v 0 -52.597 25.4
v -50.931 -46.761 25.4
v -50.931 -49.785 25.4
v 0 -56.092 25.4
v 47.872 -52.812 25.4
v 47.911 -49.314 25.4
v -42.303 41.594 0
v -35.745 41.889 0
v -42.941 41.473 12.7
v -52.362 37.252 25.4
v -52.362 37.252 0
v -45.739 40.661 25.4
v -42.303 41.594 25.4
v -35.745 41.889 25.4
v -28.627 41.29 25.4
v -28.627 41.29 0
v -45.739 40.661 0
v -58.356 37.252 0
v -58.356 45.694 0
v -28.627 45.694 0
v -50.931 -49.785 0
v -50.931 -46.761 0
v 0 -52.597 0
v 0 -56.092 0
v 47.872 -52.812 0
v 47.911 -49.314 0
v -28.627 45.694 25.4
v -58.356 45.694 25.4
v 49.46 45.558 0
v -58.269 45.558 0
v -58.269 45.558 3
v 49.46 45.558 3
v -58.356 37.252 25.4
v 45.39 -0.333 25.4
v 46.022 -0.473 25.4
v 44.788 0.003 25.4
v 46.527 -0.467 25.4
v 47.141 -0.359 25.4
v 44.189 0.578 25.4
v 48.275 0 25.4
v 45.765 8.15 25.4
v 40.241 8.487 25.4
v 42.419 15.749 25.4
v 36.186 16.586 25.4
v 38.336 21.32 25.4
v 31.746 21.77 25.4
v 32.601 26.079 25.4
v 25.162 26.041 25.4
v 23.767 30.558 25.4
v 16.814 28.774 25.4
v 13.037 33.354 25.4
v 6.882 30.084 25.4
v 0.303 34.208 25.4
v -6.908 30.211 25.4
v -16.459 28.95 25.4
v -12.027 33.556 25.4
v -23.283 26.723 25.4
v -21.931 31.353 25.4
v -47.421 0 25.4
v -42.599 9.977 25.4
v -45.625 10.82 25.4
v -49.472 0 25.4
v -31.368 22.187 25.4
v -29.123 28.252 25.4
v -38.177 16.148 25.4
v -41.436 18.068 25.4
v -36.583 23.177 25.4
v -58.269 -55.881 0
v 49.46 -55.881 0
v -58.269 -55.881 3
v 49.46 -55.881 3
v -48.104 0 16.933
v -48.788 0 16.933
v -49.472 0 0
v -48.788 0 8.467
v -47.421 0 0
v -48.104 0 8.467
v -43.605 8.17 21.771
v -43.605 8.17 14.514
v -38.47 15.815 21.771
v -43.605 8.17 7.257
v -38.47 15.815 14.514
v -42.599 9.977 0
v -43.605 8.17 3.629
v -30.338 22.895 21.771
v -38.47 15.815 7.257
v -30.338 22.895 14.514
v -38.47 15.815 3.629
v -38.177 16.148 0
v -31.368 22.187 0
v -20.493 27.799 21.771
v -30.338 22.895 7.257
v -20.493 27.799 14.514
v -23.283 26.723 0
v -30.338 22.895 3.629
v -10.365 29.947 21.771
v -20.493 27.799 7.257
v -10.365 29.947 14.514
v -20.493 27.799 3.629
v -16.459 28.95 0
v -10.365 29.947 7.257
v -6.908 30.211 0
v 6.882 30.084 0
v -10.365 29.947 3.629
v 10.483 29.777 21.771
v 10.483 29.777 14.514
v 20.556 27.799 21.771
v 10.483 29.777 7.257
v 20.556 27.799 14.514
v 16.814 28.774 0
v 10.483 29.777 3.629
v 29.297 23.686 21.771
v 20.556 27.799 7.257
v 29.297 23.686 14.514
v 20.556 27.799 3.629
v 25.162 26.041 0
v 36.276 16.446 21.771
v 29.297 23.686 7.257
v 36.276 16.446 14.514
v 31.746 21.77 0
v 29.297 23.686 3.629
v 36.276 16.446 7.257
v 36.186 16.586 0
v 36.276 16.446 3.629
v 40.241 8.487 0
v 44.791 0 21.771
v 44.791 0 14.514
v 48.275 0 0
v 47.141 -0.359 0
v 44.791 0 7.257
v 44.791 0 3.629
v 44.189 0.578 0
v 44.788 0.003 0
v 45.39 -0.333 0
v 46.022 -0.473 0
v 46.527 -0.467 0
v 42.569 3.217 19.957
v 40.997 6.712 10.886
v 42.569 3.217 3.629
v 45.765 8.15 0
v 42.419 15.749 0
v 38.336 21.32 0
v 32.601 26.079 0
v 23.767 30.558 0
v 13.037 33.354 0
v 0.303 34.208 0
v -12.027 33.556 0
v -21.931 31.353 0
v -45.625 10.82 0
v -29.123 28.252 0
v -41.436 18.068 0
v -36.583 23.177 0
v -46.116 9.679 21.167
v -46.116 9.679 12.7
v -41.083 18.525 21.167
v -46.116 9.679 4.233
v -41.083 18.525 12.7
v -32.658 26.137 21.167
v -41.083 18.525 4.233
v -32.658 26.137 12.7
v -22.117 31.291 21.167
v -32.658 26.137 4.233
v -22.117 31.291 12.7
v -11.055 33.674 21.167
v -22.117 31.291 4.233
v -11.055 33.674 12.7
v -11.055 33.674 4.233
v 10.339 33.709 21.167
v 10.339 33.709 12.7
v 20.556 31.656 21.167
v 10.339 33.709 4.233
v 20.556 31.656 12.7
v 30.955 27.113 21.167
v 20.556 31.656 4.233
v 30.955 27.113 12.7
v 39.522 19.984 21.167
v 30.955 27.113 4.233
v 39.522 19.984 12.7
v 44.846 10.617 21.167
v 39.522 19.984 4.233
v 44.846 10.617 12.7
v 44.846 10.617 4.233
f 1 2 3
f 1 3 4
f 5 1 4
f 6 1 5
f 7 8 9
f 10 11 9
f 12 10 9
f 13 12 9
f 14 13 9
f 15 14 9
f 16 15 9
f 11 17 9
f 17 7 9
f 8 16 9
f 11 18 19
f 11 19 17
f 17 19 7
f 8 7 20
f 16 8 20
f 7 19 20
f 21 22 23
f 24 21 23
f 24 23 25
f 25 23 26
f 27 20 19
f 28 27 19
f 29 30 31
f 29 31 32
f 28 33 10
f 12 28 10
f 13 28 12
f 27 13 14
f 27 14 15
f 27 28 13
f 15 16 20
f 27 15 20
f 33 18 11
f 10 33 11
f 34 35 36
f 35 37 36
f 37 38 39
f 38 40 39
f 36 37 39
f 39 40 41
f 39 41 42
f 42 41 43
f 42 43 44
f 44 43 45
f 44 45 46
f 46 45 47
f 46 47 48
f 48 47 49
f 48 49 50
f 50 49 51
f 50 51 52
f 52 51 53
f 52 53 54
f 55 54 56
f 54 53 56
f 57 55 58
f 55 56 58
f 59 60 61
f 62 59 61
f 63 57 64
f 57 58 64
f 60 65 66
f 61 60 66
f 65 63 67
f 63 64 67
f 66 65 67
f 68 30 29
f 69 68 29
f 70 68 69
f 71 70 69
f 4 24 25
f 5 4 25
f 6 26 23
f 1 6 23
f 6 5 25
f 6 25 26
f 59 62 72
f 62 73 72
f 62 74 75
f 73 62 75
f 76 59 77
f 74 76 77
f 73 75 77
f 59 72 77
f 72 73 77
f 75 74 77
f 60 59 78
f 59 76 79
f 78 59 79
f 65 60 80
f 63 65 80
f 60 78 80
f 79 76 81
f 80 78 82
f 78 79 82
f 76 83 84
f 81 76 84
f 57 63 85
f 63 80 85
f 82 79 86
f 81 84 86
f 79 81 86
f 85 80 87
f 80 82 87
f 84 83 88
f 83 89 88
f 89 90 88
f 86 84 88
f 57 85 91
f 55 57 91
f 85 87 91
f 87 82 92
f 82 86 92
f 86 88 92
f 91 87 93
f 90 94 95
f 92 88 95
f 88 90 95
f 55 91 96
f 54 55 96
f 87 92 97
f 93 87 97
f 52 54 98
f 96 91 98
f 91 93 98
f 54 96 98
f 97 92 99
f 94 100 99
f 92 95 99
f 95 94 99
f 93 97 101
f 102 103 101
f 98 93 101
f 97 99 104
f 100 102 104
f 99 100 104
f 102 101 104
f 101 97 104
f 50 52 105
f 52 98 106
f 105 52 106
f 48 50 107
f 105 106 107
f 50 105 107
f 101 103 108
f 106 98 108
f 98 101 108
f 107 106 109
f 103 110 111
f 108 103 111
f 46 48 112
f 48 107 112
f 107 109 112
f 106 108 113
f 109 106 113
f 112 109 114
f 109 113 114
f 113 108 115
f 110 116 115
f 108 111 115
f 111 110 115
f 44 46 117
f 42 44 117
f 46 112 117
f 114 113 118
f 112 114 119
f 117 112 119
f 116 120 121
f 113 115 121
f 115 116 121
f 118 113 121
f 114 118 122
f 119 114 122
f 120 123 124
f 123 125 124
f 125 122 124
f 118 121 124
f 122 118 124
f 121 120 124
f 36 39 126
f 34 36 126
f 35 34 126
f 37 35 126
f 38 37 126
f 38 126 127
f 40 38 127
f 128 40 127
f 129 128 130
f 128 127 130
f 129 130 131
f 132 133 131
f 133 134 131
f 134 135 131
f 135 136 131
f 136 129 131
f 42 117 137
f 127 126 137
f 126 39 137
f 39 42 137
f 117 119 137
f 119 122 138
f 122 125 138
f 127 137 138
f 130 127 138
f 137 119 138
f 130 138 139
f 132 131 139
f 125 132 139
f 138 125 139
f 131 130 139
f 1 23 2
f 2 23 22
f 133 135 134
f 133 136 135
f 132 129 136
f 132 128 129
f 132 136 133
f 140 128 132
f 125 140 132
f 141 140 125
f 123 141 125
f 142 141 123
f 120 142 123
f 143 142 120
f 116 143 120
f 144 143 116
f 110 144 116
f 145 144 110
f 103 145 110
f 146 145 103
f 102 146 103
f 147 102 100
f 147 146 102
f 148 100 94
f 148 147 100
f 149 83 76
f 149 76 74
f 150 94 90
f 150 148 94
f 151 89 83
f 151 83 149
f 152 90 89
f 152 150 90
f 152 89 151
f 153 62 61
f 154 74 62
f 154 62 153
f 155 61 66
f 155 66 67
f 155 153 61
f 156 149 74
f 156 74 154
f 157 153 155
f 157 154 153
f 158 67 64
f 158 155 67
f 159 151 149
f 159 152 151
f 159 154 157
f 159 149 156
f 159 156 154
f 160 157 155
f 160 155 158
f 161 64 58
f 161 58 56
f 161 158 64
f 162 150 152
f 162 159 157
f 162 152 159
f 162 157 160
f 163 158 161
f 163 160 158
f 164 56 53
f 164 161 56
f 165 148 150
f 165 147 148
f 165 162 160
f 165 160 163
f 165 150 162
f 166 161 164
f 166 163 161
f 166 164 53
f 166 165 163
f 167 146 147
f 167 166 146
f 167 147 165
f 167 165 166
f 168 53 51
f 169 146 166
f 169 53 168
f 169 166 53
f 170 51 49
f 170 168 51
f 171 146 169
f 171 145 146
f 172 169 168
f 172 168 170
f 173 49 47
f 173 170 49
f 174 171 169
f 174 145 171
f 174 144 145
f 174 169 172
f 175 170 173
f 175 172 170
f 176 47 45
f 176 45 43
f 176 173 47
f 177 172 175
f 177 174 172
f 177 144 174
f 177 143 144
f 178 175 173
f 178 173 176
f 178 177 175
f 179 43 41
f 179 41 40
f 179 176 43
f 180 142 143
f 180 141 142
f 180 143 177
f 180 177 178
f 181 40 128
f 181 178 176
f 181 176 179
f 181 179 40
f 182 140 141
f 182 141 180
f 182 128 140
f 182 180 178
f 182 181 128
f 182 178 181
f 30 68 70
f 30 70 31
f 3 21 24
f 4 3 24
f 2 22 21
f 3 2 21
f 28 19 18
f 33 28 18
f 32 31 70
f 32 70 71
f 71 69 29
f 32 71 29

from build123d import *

# Parameters (mm, degrees)
F2_DEPTH = 25.4
F4_DEPTH = 25.4
F7_W     = 107.728920877
F7_H     = 101.4381758869
F8_DEPTH = 3


# Not quite as in the source:
# - a feature of the source that left no trace in its solid (it failed there, or was rolled back) is left out


with BuildPart() as f2:
    # F1 (on Top) → F2 (new body)
    with BuildSketch(Plane.XY):
        Polygon((0, -52.5968633592), (-50.9308427572, -46.761199832), (-50.9308427572, -49.7846864164), (0, -56.0923367739), (47.871535476, -52.812457282), (47.9106865823, -49.314301461), align=None)
    extrude(amount=F2_DEPTH)


with BuildPart() as f2b:
    # F1 (on Top) → F2, piece 2 (new body)
    with BuildSketch(Plane.XY):
        with BuildLine():
            add(Edge.make_bspline(
                [(-49.4719222188, 0), (-47.4205755879, 6.544775019), (-43.1942210623, 20.0288635212), (-22.5111385572, 33.2669128259), (0.0334513522, 34.6754363871), (20.6787838864, 33.2616809804), (42.0254177462, 21.7261812452), (46.1992146547, 7.2172589855), (48.275411129, 0)],
                knots=[0, 0, 0, 0, 0.1613126113, 0.3323496255, 0.5013055914, 0.6641099851, 0.8329162439, 1, 1, 1, 1], degree=3))
            add(Edge.make_bspline(
                [(-49.4719222188, 0), (-48.7881400085, 0), (-48.1043577982, 0), (-47.4205755879, 0)],
                knots=[0, 0, 0, 0, 2.0513466309, 2.0513466309, 2.0513466309, 2.0513466309], degree=3))
            add(Edge.make_bspline(
                [(-47.4205755879, 0), (-45.023795475, 5.5050731836), (-40.013610592, 17.0127764963), (-20.8333104147, 29.7676194141), (-0.1210192078, 30.7096554729), (21.0037992002, 29.3354980818), (37.8639372795, 19.2664559838), (43.1661496501, -1.7953891308), (47.0887209969, -0.4170016691), (48.275411129, 0)],
                knots=[0, 0, 0, 0, 0.1491588243, 0.3117988516, 0.4707933547, 0.6300285532, 0.78410953, 0.9346869521, 1, 1, 1, 1], degree=3))
        make_face()
    extrude(amount=F2_DEPTH)


with BuildPart() as f4:
    # F0 (on Top) → F4 (new body)
    with BuildSketch(Plane.XY):
        with BuildLine():
            Line((-58.3559162915, 37.2523628175), (-52.3617714643, 37.2523628175))
            add(Edge.make_bspline(
                [(-52.3617714643, 37.2523628175), (-49.4308542357, 38.9942348261), (-43.0485284896, 42.7873117707), (-33.688896908, 41.8152382446), (-28.6274328828, 41.2895642221)],
                knots=[0, 0, 0, 0, 0.459224011, 1, 1, 1, 1], degree=3))
            Line((-28.6274328828, 41.2895642221), (-28.6274328828, 45.6937812269))
            Line((-28.6274328828, 45.6937812269), (-58.3559162915, 45.6937812269))
            Line((-58.3559162915, 45.6937812269), (-58.3559162915, 37.2523628175))
        make_face()
    extrude(amount=F4_DEPTH)


with BuildPart() as f8:
    # F7 (on Top) → F8 (new body)
    with BuildSketch(Plane.XY):
        with Locations((-4.40428406, -5.1615331322)):
            Rectangle(F7_W, F7_H)
    extrude(amount=F8_DEPTH)


solid = Compound([f2.part, f2b.part, f4.part, f8.part])
